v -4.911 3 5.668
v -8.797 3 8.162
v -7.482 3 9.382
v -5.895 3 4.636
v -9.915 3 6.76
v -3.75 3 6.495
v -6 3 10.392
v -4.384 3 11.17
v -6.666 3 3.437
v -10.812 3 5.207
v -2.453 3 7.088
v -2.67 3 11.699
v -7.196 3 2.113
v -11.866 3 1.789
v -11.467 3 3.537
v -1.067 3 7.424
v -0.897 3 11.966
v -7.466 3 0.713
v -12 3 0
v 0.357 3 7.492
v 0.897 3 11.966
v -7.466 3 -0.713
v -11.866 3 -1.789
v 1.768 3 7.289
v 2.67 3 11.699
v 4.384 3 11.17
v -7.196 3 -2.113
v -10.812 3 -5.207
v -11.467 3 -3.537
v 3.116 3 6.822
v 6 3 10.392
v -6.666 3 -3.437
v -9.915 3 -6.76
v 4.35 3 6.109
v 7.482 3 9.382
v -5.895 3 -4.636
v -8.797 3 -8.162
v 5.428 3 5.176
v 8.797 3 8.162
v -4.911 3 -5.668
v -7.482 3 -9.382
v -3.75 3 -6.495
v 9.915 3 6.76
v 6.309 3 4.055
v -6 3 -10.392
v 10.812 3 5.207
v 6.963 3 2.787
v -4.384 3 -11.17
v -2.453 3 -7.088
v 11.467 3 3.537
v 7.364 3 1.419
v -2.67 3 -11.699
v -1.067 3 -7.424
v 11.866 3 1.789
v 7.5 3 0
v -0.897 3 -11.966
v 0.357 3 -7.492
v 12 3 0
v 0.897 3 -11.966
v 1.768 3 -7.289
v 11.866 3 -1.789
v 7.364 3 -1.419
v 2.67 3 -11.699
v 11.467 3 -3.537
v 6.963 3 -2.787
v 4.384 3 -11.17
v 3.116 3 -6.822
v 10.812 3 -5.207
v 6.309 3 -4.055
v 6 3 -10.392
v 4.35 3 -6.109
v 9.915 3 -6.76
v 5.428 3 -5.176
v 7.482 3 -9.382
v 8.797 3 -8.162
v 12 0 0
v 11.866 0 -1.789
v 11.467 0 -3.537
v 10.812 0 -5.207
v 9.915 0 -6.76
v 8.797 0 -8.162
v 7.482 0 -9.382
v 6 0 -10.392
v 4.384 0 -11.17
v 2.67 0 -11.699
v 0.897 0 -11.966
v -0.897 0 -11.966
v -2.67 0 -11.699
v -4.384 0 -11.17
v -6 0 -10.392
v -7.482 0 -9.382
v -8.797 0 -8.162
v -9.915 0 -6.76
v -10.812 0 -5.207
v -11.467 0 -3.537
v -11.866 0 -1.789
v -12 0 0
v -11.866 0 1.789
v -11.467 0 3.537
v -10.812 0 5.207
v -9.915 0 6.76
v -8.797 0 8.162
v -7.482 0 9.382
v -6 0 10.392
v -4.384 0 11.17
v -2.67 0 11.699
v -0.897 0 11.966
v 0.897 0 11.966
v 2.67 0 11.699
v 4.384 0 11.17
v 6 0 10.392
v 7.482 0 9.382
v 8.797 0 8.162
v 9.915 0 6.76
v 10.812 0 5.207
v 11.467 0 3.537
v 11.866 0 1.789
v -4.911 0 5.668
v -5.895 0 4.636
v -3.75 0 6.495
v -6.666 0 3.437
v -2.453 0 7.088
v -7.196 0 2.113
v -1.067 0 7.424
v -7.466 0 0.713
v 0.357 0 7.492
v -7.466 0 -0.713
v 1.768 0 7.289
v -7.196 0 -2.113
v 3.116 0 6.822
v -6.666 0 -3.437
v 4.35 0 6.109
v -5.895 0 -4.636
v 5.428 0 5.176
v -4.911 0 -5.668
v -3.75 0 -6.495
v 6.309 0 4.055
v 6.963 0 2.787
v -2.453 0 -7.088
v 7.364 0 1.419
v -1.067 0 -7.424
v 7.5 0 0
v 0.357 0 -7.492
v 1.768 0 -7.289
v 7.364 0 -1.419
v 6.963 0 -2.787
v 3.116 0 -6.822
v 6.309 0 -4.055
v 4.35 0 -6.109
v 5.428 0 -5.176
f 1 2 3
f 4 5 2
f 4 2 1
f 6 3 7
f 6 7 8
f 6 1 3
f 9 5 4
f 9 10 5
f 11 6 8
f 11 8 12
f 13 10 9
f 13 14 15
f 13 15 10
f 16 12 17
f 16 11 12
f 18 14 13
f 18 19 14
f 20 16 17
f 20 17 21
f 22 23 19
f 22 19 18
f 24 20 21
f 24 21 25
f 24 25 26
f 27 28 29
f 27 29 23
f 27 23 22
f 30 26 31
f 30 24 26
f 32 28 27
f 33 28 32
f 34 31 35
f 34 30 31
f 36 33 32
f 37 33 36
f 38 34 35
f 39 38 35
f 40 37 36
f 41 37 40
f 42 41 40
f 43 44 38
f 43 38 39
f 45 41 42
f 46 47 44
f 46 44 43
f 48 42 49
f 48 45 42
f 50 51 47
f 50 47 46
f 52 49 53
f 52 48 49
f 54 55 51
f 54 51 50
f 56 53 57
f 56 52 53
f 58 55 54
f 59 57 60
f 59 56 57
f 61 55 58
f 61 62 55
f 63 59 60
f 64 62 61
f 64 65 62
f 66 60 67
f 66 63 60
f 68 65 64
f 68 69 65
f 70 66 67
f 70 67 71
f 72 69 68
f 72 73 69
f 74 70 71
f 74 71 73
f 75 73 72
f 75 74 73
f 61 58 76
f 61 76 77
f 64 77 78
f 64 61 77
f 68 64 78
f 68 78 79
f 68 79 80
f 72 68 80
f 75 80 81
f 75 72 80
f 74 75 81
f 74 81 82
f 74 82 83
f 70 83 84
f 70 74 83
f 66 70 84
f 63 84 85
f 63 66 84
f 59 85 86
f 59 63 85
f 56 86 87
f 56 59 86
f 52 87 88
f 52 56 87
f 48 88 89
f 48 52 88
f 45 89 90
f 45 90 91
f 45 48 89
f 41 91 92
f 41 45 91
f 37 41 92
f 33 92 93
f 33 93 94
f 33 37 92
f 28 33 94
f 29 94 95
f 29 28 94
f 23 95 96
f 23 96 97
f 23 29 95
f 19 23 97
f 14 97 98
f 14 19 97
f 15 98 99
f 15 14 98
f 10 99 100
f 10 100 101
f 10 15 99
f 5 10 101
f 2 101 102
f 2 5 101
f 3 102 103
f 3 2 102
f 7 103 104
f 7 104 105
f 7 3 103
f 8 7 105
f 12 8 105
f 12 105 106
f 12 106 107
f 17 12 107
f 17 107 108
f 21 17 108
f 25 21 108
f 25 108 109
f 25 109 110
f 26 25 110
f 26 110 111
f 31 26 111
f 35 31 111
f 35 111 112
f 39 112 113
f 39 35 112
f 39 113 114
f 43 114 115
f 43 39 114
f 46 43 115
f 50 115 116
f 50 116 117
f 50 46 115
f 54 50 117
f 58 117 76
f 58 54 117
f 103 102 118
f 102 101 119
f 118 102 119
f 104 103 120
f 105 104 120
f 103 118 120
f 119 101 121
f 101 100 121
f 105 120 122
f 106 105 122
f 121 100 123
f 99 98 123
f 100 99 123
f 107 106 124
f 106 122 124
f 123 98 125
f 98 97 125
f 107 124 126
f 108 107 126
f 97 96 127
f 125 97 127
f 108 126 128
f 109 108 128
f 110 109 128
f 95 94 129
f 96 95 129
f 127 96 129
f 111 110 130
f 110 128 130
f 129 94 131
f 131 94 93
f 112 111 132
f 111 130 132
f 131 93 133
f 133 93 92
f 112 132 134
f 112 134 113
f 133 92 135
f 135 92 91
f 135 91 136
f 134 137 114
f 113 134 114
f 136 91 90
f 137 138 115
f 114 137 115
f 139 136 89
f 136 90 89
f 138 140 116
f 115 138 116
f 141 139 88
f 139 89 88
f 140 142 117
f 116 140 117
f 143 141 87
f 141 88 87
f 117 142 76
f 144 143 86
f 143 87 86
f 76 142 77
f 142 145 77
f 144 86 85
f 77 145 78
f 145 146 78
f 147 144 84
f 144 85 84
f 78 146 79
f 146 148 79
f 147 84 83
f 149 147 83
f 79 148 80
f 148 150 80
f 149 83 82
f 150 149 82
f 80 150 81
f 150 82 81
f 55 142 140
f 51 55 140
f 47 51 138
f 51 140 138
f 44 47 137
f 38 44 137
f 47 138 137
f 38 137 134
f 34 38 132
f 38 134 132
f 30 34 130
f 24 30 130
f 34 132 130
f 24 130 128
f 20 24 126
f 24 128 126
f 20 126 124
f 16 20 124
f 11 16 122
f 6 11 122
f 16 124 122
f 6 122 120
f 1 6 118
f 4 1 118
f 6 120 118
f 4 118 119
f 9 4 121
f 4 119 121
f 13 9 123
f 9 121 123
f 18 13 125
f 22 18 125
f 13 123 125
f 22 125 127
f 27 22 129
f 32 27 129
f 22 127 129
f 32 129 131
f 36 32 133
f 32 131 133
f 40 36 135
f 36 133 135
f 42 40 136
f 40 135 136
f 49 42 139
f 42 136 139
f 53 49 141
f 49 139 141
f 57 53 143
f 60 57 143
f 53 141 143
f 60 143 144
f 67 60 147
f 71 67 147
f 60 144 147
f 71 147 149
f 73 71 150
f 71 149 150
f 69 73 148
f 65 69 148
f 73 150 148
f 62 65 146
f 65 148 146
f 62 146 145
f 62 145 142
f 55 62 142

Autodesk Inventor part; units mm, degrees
ref_plane "YZ Plane" through (0, 0, 0) normal (1, 0, 0) x (0, 1, 0)
ref_plane "XZ Plane" through (0, 0, 0) normal (0, 1, 0) x (-1, 0, 0)
ref_plane "XY Plane" through (0, 0, 0) normal (0, 0, 1) x (1, 0, 0)
sketch "Sketch1" plane through (0, 0, 0) normal (0, 1, 0) x (-1, 0, 0)
  circle A0 centre (0, 0) radius 7.5
  circle A1 centre (0, 0) radius 10
  dimension "d0" = 15
  dimension "d1" = 20
extrude "Extrusion1" add sketch "Sketch1" along normal blind 3
sketch "Sketch2" plane through (0, 3, 0) normal (0, 1, 0) x (1, 0, 0)
  circle A0 centre (0, 0) radius 9.6429
  circle A1 centre (0, 0) radius 13.5
  circle A2 centre (0, 0) radius 7.5
  dimension "d4" = 27
extrude "Extrusion2" add sketch "Sketch2" against normal up to surface (3 mm away) contours A0 | A1 | A2
sketch "Sketch3" plane through (0, 0, 0) normal (0, -1, 0) x (1, 0, 0)
  circle A0 centre (0, 0) radius 7.5
  dimension "d7" = 15
extrude "Extrusion3" cut sketch "Sketch3" against normal up to surface (3 mm away)
sketch "Sketch4" plane through (0, 3, 0) normal (0, 1, 0) x (1, 0, 0)
  circle A0 centre (0, 0) radius 12
  circle A1 centre (0, 0) radius 13.5
  dimension "d10" = 24
extrude "Extrusion4" cut sketch "Sketch4" against normal up to surface (3 mm away)
properties part number "DedoSoporte"
